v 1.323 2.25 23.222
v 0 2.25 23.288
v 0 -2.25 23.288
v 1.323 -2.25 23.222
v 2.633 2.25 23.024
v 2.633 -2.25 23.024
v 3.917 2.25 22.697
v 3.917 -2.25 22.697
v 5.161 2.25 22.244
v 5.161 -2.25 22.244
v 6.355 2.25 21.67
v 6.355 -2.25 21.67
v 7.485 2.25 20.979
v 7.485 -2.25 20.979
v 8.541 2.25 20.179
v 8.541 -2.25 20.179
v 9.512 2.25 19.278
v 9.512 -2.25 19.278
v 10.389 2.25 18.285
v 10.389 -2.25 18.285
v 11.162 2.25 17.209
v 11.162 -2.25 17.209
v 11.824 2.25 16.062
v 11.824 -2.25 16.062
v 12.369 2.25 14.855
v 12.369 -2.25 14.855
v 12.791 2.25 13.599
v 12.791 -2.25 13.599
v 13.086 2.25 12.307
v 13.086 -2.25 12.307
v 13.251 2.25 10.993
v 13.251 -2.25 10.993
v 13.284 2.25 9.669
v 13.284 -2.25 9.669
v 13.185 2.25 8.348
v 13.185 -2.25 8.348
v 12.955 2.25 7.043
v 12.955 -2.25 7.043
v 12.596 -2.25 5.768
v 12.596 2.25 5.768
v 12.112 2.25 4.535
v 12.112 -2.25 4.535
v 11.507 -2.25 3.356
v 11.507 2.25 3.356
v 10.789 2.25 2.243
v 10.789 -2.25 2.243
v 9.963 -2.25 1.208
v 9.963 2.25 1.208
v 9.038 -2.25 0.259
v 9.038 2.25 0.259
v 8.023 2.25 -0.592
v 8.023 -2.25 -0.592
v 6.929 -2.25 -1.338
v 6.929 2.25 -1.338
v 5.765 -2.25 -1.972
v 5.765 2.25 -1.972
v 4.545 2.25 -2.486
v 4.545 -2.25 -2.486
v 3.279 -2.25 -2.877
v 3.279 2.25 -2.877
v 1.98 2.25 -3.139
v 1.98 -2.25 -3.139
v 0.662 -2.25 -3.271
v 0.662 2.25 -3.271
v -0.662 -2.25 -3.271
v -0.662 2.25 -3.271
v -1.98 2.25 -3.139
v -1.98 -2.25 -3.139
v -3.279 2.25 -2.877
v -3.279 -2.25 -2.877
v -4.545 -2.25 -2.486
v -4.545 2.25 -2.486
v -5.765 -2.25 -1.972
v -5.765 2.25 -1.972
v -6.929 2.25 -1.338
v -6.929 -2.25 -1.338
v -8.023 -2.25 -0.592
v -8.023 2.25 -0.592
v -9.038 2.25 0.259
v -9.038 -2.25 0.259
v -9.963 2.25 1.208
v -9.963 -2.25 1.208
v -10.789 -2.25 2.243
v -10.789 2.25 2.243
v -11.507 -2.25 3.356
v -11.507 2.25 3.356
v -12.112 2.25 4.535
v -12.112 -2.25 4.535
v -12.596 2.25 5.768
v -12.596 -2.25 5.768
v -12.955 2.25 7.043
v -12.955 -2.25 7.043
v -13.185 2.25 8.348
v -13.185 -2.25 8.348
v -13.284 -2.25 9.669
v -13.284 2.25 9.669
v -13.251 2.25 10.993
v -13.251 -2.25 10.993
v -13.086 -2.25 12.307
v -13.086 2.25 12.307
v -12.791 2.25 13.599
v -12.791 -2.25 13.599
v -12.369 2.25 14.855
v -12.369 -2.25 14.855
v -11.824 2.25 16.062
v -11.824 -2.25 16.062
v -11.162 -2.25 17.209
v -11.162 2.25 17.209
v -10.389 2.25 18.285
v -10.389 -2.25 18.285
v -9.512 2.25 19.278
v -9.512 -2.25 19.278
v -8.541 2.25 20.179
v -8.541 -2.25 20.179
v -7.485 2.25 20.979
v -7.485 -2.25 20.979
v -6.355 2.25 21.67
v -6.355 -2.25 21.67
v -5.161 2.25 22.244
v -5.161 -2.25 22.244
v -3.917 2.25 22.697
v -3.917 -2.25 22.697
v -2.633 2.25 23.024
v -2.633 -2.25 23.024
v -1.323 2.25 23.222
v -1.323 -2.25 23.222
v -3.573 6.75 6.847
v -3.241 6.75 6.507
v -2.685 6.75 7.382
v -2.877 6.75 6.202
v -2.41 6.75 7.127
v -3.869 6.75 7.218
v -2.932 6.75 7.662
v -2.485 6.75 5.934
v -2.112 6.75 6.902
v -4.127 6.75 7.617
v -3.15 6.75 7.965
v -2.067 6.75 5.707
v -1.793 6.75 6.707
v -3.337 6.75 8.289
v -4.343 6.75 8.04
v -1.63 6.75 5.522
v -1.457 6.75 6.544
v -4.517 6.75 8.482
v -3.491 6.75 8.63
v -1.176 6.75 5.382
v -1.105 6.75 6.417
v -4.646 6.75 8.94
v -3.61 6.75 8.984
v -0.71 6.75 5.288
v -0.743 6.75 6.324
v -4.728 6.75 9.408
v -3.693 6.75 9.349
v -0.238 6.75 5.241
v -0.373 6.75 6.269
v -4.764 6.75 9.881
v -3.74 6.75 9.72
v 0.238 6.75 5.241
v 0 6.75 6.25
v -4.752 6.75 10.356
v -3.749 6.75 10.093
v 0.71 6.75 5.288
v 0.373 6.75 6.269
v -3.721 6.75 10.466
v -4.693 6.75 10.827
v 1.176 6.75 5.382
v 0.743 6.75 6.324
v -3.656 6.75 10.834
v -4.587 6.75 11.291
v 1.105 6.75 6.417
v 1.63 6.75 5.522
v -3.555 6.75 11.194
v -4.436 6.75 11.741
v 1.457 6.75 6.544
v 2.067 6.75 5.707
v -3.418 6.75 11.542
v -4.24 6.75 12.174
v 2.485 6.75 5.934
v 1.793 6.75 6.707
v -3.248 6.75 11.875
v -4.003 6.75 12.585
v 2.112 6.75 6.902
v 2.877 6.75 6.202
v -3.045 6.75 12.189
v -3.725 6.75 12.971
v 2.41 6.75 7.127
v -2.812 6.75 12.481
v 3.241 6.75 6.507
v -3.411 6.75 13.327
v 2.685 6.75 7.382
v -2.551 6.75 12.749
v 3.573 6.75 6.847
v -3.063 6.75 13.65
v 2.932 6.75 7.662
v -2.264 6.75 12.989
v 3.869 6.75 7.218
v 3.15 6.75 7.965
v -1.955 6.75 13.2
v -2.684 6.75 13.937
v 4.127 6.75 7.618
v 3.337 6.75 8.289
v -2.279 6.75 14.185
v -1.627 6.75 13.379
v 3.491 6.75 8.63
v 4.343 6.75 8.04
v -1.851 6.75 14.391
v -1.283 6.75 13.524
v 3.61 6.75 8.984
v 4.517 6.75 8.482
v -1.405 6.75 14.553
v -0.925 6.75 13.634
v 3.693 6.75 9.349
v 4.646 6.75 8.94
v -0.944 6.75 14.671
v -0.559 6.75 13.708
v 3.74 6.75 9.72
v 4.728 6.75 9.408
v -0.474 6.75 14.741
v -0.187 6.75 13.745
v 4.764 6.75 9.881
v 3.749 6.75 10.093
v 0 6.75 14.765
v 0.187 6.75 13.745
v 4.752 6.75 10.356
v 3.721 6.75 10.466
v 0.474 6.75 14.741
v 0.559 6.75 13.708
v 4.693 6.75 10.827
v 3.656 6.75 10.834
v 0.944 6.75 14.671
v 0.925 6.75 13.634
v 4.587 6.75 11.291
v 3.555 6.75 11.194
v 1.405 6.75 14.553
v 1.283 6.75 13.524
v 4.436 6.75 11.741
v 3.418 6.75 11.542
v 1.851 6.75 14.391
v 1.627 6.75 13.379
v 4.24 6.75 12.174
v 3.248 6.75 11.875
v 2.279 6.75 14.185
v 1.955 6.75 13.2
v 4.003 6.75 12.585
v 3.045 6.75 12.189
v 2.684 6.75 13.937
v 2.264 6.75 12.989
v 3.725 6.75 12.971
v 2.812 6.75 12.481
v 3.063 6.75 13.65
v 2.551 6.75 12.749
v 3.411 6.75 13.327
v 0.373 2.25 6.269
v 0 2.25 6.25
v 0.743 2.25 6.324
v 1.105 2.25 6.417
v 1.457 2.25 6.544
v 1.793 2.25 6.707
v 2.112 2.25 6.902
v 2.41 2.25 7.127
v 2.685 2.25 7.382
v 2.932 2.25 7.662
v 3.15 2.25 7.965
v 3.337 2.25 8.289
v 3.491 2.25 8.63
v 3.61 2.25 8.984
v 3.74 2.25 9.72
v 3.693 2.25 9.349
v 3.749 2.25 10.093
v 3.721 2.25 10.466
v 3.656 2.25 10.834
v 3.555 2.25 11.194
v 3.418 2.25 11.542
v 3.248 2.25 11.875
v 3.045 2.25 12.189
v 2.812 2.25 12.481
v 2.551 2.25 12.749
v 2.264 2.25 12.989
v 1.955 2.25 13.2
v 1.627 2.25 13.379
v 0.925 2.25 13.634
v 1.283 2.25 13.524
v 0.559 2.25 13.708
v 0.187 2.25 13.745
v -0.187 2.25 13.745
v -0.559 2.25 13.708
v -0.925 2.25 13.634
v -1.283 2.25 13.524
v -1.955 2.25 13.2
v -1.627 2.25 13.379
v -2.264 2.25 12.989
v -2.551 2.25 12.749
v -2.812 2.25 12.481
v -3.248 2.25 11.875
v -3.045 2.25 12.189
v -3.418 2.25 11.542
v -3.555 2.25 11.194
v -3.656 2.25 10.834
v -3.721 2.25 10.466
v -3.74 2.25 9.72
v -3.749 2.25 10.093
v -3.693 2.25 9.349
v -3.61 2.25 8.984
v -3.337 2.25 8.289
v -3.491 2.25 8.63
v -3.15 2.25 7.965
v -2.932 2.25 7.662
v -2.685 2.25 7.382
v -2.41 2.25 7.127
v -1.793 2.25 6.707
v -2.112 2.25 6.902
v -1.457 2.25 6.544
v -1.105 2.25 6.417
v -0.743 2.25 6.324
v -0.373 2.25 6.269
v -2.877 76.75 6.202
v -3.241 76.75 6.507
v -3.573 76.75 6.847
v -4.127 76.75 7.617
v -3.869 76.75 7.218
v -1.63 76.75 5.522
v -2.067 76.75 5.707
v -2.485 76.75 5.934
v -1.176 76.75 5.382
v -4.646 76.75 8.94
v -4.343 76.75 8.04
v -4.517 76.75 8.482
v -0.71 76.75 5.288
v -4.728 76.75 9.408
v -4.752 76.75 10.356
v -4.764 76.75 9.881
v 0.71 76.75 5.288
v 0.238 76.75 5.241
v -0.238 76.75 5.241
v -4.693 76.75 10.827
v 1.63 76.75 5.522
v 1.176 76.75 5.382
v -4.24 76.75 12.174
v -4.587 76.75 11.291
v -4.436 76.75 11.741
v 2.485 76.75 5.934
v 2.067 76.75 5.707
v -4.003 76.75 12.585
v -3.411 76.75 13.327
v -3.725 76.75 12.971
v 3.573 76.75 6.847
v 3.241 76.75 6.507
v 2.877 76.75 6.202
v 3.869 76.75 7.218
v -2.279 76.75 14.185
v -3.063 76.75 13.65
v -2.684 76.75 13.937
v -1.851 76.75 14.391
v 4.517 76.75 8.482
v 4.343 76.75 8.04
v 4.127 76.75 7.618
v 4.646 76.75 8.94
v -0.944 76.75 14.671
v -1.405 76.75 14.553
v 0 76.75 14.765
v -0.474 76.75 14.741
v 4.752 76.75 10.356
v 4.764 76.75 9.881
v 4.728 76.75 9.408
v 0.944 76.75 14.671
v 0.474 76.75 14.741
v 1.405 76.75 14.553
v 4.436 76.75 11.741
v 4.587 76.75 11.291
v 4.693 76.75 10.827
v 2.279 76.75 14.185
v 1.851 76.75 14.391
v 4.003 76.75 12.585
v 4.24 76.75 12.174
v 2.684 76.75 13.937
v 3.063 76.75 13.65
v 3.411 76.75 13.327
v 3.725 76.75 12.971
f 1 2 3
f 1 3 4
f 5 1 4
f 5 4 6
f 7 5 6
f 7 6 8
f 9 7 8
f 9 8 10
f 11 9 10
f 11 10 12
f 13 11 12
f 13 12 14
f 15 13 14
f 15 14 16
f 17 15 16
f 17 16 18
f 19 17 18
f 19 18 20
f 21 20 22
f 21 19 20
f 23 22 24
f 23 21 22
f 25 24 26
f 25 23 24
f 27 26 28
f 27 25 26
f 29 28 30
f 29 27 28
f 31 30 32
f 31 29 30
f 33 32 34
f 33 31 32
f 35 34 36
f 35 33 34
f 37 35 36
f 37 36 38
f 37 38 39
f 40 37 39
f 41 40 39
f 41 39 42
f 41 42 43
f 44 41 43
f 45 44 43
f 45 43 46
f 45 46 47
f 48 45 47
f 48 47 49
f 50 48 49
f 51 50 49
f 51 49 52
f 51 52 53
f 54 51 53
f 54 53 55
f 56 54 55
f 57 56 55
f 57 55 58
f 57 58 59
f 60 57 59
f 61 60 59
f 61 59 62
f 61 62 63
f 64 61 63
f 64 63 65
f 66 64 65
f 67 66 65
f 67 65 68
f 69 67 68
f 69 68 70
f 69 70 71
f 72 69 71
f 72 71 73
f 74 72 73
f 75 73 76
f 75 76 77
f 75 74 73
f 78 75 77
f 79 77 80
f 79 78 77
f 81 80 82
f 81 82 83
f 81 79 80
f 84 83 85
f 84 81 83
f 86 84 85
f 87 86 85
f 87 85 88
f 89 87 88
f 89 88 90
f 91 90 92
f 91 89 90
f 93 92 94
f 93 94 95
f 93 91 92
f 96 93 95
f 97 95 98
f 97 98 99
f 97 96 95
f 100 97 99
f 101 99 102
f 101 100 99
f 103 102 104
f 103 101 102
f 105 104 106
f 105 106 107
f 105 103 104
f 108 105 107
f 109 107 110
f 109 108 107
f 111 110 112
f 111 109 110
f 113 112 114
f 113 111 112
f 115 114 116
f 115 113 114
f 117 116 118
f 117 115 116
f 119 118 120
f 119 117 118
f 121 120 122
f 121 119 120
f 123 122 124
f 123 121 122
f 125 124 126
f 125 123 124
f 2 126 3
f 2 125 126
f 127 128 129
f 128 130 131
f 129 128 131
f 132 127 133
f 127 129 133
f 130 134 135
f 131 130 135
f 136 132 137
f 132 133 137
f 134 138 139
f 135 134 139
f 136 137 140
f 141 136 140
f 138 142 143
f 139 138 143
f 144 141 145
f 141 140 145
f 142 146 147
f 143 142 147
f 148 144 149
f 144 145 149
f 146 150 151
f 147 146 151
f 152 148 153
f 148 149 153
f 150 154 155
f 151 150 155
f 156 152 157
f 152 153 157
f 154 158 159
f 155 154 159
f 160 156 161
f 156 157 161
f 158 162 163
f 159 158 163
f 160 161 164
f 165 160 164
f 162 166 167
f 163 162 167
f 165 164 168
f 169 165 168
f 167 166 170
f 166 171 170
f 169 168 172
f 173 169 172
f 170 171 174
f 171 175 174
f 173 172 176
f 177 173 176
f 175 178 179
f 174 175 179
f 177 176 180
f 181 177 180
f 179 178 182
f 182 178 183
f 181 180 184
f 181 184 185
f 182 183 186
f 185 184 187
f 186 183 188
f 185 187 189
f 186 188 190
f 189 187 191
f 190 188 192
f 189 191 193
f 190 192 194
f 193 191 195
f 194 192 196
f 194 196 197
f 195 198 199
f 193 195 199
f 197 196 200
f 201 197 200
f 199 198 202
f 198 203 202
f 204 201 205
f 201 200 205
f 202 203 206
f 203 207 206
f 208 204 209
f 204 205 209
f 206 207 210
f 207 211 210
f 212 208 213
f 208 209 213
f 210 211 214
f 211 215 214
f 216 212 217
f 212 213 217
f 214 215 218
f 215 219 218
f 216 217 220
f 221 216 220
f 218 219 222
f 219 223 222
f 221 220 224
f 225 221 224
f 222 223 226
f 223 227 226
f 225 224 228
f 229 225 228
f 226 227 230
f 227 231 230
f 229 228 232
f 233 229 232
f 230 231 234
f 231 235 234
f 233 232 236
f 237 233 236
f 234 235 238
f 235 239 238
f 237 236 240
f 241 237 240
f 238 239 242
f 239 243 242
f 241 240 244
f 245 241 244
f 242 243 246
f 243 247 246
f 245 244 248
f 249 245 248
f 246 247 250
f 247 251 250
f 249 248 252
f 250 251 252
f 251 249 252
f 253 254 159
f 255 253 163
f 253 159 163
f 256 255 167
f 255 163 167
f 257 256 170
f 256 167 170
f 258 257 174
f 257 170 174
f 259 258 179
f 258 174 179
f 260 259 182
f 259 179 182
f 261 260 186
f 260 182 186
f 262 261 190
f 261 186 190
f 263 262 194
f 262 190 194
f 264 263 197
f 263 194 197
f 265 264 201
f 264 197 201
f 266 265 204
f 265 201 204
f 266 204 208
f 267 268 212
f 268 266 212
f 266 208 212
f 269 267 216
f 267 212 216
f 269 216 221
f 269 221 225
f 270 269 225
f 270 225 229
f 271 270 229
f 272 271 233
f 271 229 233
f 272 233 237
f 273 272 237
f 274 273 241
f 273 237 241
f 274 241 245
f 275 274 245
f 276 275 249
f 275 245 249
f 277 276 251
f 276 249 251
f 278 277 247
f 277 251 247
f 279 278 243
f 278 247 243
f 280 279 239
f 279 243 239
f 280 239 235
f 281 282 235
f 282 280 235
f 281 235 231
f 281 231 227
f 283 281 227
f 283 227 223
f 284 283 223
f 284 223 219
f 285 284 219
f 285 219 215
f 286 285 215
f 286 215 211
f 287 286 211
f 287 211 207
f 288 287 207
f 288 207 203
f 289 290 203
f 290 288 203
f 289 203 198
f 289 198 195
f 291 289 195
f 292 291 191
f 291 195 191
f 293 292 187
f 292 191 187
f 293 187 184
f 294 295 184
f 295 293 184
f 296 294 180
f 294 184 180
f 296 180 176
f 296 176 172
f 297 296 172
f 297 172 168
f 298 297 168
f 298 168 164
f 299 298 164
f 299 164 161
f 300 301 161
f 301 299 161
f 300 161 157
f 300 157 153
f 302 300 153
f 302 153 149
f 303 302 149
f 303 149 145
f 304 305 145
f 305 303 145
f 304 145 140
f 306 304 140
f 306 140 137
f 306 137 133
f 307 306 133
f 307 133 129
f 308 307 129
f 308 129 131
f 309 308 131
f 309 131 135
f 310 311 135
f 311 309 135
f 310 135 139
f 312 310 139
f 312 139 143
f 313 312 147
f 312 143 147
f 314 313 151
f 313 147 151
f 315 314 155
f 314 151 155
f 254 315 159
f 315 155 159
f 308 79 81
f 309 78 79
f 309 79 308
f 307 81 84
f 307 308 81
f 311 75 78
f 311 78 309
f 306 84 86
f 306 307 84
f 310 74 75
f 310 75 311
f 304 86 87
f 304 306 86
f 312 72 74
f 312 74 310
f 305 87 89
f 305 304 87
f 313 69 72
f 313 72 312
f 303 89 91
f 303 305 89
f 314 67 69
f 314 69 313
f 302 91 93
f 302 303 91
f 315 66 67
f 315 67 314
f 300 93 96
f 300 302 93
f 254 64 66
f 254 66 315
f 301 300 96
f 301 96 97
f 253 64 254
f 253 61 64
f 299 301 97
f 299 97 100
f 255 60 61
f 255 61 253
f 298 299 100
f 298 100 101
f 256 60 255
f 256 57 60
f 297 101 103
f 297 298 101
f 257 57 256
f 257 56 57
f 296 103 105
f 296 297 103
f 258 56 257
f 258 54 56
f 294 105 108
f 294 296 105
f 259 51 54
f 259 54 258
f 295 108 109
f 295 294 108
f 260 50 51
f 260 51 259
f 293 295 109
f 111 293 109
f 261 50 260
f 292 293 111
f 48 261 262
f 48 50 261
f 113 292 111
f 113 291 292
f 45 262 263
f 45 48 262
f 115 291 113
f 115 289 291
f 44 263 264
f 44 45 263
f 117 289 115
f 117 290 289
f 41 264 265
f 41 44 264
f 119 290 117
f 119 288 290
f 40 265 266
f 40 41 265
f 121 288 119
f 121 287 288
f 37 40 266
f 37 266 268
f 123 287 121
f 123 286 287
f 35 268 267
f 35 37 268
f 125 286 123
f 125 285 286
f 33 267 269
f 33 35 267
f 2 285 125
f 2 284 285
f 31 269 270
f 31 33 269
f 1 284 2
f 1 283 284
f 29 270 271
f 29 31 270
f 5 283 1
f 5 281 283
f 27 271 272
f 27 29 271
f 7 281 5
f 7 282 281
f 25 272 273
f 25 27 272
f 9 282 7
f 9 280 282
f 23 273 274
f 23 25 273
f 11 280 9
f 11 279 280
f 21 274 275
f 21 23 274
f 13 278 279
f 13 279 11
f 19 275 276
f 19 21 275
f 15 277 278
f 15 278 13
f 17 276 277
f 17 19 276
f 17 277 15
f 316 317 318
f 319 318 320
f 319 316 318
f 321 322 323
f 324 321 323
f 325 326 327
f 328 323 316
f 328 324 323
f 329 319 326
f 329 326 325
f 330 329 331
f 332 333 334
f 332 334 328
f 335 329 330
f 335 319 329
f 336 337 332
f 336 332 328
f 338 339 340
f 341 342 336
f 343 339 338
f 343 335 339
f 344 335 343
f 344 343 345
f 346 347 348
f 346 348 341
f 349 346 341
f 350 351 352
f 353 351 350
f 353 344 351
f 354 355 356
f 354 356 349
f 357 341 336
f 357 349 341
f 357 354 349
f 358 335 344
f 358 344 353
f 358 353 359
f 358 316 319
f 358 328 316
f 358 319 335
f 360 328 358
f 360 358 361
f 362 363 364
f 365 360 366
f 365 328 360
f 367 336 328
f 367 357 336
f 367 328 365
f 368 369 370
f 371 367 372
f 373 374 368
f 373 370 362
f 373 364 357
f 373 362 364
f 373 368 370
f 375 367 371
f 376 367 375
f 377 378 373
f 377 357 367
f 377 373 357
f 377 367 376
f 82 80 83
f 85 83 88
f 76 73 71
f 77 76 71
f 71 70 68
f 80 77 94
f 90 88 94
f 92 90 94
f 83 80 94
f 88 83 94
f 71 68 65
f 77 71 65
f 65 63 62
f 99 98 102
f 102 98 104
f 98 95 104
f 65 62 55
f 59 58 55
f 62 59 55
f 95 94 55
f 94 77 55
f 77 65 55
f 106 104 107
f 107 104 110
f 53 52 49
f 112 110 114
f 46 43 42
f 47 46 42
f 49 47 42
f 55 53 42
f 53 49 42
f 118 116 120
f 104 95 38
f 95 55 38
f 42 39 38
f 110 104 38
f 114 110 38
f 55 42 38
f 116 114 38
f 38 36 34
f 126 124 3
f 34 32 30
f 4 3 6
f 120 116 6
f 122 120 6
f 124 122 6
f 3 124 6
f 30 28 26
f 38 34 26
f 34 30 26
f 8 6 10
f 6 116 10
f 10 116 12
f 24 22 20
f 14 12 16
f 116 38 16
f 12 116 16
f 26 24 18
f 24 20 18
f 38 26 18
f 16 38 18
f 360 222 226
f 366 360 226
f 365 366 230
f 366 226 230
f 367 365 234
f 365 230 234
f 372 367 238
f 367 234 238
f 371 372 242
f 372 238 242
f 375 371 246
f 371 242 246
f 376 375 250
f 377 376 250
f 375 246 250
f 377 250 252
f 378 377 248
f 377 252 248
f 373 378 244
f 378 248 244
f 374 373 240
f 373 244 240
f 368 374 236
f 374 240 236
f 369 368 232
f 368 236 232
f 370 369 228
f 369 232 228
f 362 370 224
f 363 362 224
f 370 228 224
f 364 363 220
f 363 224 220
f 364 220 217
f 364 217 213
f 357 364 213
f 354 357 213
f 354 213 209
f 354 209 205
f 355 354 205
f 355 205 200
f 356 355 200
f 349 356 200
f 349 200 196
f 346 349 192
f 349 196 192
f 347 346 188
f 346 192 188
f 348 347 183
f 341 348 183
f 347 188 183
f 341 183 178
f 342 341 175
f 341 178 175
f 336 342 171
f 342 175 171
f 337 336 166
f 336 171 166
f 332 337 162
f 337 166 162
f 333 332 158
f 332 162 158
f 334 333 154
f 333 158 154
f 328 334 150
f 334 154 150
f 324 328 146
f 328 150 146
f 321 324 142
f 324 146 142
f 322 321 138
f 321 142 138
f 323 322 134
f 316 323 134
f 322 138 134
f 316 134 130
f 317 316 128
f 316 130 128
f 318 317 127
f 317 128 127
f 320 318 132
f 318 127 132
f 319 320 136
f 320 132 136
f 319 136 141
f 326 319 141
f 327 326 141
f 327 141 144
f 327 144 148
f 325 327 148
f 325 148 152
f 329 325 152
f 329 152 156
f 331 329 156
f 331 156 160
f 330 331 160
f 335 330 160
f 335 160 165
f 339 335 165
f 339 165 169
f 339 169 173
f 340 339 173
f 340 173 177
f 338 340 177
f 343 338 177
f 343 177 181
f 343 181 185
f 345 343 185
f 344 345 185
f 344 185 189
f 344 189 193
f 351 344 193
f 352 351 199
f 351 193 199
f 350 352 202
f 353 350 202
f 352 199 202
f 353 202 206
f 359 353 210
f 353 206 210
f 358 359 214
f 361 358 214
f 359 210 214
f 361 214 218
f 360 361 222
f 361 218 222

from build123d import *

# Parameters (mm, degrees)
SALIENTE_EXTRUIR1_DEPTH = 20
CORTAR_EXTRUIR1_REACH   = 24.289
CROQUIS2_R              = 3.75
SALIENTE_EXTRUIR2_START = -9
CROQUIS3_R              = 3.75
SALIENTE_EXTRUIR2_DEPTH = 9
CROQUIS4_R              = 4.765
SALIENTE_EXTRUIR3_DEPTH = 70
CROQUIS5_R              = 13.287682266
SALIENTE_EXTRUIR4_DEPTH = 4.5


with BuildPart() as part:
    # Croquis1 → Saliente-Extruir1 (new body)
    with BuildSketch(Plane.XY):
        Polygon((-8.75, 2.25), (8.75, 2.25), (4.25, -2.25), (-4.25, -2.25), align=None)
    extrude(amount=SALIENTE_EXTRUIR1_DEPTH)

    # Croquis2 → Cortar-Extruir1 (cut, up to next)
    with BuildSketch(Plane(origin=(0, 2.25, 0), x_dir=(1, 0, 0), z_dir=(0, 1, 0)), mode=Mode.PRIVATE) as cortar_extruir1_sk1:
        with Locations(Location((0, -10, 0), (0, 0, 270))):
            Circle(CROQUIS2_R)
    cortar_extruir1_tool1 = extrude(cortar_extruir1_sk1.sketch, amount=-CORTAR_EXTRUIR1_REACH, mode=Mode.PRIVATE) & part.part
    add(cortar_extruir1_tool1.solids().sort_by_distance((0, 2.25, 10))[0], mode=Mode.SUBTRACT)

    # Croquis3 → Saliente-Extruir2 (add)
    with BuildSketch(Plane.XZ.offset(2.25).offset(SALIENTE_EXTRUIR2_START)):
        with Locations(Location((0, 10, 0), (0, 0, 270))):
            Circle(CROQUIS3_R)
    extrude(amount=SALIENTE_EXTRUIR2_DEPTH)

    # Croquis4 → Saliente-Extruir3 (add)
    with BuildSketch(Plane(origin=(0, 6.75, 0), x_dir=(1, 0, 0), z_dir=(0, 1, 0))):
        with Locations(Location((0, -10, 0), (0, 0, 270))):
            Circle(CROQUIS4_R)
    extrude(amount=SALIENTE_EXTRUIR3_DEPTH)

    # Croquis5 → Saliente-Extruir4 (add)
    with BuildSketch(Plane(origin=(0, 2.25, 0), x_dir=(1, 0, 0), z_dir=(0, 1, 0))):
        with Locations(Location((0, -10, 0), (0, 0, 270))):
            Circle(CROQUIS5_R)
    extrude(amount=-SALIENTE_EXTRUIR4_DEPTH)


solid = part.part
